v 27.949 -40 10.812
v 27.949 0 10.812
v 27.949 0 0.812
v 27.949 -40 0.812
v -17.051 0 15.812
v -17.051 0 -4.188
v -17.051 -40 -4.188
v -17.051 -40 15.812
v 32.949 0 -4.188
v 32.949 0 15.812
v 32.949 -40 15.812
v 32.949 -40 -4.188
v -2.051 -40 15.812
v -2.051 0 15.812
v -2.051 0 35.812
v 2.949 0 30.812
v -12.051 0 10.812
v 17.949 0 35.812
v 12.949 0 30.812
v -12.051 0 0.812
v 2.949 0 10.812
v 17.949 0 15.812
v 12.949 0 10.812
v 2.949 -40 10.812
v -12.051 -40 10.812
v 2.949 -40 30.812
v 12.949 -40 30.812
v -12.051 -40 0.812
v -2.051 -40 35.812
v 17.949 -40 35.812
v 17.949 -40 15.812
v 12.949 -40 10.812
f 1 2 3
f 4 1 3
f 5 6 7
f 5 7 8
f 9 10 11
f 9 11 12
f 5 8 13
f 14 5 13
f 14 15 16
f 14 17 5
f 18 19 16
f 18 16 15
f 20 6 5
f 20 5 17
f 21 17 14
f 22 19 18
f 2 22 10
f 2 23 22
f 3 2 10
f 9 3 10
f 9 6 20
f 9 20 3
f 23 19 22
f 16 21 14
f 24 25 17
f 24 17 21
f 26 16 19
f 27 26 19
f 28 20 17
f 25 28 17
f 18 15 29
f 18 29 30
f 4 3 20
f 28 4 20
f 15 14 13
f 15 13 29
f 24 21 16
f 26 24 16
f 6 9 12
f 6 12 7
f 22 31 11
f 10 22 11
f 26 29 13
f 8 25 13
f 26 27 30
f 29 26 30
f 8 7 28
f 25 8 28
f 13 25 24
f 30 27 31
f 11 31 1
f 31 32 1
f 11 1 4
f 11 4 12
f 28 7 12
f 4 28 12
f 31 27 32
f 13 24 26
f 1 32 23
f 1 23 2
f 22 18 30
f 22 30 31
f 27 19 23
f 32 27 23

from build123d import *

# Parameters (mm, degrees)
BOSS_EXTRUDE2_DEPTH = 40
CUT_EXTRUDE1_DEPTH  = 40


with BuildPart() as part:
    # Sketch1 → Boss-Extrude2 (new body)
    with BuildSketch(Plane(origin=(0, 0, 0), x_dir=(1, 0, 0), z_dir=(0, 1, 0))):
        Polygon((32.948717949, 4.188034188), (-17.051282051, 4.188034188), (-17.051282051, -15.811965812), (-2.051282051, -15.811965812), (-2.051282051, -35.811965812), (17.948717949, -35.811965812), (17.948717949, -15.811965812), (32.948717949, -15.811965812), align=None)
    extrude(amount=-BOSS_EXTRUDE2_DEPTH)

    # Sketch3 → Cut-Extrude1 (cut)
    with BuildSketch(Plane(origin=(0, 0, 0), x_dir=(1, 0, 0), z_dir=(0, 1, 0))):
        Polygon((27.948717949, -0.811965812), (-12.051282051, -0.811965812), (-12.051282051, -10.811965812), (2.948717949, -10.811965812), (2.948717949, -30.811965812), (12.948717949, -30.811965812), (12.948717949, -10.811965812), (27.948717949, -10.811965812), align=None)
    extrude(amount=-CUT_EXTRUDE1_DEPTH, mode=Mode.SUBTRACT)


solid = part.part
